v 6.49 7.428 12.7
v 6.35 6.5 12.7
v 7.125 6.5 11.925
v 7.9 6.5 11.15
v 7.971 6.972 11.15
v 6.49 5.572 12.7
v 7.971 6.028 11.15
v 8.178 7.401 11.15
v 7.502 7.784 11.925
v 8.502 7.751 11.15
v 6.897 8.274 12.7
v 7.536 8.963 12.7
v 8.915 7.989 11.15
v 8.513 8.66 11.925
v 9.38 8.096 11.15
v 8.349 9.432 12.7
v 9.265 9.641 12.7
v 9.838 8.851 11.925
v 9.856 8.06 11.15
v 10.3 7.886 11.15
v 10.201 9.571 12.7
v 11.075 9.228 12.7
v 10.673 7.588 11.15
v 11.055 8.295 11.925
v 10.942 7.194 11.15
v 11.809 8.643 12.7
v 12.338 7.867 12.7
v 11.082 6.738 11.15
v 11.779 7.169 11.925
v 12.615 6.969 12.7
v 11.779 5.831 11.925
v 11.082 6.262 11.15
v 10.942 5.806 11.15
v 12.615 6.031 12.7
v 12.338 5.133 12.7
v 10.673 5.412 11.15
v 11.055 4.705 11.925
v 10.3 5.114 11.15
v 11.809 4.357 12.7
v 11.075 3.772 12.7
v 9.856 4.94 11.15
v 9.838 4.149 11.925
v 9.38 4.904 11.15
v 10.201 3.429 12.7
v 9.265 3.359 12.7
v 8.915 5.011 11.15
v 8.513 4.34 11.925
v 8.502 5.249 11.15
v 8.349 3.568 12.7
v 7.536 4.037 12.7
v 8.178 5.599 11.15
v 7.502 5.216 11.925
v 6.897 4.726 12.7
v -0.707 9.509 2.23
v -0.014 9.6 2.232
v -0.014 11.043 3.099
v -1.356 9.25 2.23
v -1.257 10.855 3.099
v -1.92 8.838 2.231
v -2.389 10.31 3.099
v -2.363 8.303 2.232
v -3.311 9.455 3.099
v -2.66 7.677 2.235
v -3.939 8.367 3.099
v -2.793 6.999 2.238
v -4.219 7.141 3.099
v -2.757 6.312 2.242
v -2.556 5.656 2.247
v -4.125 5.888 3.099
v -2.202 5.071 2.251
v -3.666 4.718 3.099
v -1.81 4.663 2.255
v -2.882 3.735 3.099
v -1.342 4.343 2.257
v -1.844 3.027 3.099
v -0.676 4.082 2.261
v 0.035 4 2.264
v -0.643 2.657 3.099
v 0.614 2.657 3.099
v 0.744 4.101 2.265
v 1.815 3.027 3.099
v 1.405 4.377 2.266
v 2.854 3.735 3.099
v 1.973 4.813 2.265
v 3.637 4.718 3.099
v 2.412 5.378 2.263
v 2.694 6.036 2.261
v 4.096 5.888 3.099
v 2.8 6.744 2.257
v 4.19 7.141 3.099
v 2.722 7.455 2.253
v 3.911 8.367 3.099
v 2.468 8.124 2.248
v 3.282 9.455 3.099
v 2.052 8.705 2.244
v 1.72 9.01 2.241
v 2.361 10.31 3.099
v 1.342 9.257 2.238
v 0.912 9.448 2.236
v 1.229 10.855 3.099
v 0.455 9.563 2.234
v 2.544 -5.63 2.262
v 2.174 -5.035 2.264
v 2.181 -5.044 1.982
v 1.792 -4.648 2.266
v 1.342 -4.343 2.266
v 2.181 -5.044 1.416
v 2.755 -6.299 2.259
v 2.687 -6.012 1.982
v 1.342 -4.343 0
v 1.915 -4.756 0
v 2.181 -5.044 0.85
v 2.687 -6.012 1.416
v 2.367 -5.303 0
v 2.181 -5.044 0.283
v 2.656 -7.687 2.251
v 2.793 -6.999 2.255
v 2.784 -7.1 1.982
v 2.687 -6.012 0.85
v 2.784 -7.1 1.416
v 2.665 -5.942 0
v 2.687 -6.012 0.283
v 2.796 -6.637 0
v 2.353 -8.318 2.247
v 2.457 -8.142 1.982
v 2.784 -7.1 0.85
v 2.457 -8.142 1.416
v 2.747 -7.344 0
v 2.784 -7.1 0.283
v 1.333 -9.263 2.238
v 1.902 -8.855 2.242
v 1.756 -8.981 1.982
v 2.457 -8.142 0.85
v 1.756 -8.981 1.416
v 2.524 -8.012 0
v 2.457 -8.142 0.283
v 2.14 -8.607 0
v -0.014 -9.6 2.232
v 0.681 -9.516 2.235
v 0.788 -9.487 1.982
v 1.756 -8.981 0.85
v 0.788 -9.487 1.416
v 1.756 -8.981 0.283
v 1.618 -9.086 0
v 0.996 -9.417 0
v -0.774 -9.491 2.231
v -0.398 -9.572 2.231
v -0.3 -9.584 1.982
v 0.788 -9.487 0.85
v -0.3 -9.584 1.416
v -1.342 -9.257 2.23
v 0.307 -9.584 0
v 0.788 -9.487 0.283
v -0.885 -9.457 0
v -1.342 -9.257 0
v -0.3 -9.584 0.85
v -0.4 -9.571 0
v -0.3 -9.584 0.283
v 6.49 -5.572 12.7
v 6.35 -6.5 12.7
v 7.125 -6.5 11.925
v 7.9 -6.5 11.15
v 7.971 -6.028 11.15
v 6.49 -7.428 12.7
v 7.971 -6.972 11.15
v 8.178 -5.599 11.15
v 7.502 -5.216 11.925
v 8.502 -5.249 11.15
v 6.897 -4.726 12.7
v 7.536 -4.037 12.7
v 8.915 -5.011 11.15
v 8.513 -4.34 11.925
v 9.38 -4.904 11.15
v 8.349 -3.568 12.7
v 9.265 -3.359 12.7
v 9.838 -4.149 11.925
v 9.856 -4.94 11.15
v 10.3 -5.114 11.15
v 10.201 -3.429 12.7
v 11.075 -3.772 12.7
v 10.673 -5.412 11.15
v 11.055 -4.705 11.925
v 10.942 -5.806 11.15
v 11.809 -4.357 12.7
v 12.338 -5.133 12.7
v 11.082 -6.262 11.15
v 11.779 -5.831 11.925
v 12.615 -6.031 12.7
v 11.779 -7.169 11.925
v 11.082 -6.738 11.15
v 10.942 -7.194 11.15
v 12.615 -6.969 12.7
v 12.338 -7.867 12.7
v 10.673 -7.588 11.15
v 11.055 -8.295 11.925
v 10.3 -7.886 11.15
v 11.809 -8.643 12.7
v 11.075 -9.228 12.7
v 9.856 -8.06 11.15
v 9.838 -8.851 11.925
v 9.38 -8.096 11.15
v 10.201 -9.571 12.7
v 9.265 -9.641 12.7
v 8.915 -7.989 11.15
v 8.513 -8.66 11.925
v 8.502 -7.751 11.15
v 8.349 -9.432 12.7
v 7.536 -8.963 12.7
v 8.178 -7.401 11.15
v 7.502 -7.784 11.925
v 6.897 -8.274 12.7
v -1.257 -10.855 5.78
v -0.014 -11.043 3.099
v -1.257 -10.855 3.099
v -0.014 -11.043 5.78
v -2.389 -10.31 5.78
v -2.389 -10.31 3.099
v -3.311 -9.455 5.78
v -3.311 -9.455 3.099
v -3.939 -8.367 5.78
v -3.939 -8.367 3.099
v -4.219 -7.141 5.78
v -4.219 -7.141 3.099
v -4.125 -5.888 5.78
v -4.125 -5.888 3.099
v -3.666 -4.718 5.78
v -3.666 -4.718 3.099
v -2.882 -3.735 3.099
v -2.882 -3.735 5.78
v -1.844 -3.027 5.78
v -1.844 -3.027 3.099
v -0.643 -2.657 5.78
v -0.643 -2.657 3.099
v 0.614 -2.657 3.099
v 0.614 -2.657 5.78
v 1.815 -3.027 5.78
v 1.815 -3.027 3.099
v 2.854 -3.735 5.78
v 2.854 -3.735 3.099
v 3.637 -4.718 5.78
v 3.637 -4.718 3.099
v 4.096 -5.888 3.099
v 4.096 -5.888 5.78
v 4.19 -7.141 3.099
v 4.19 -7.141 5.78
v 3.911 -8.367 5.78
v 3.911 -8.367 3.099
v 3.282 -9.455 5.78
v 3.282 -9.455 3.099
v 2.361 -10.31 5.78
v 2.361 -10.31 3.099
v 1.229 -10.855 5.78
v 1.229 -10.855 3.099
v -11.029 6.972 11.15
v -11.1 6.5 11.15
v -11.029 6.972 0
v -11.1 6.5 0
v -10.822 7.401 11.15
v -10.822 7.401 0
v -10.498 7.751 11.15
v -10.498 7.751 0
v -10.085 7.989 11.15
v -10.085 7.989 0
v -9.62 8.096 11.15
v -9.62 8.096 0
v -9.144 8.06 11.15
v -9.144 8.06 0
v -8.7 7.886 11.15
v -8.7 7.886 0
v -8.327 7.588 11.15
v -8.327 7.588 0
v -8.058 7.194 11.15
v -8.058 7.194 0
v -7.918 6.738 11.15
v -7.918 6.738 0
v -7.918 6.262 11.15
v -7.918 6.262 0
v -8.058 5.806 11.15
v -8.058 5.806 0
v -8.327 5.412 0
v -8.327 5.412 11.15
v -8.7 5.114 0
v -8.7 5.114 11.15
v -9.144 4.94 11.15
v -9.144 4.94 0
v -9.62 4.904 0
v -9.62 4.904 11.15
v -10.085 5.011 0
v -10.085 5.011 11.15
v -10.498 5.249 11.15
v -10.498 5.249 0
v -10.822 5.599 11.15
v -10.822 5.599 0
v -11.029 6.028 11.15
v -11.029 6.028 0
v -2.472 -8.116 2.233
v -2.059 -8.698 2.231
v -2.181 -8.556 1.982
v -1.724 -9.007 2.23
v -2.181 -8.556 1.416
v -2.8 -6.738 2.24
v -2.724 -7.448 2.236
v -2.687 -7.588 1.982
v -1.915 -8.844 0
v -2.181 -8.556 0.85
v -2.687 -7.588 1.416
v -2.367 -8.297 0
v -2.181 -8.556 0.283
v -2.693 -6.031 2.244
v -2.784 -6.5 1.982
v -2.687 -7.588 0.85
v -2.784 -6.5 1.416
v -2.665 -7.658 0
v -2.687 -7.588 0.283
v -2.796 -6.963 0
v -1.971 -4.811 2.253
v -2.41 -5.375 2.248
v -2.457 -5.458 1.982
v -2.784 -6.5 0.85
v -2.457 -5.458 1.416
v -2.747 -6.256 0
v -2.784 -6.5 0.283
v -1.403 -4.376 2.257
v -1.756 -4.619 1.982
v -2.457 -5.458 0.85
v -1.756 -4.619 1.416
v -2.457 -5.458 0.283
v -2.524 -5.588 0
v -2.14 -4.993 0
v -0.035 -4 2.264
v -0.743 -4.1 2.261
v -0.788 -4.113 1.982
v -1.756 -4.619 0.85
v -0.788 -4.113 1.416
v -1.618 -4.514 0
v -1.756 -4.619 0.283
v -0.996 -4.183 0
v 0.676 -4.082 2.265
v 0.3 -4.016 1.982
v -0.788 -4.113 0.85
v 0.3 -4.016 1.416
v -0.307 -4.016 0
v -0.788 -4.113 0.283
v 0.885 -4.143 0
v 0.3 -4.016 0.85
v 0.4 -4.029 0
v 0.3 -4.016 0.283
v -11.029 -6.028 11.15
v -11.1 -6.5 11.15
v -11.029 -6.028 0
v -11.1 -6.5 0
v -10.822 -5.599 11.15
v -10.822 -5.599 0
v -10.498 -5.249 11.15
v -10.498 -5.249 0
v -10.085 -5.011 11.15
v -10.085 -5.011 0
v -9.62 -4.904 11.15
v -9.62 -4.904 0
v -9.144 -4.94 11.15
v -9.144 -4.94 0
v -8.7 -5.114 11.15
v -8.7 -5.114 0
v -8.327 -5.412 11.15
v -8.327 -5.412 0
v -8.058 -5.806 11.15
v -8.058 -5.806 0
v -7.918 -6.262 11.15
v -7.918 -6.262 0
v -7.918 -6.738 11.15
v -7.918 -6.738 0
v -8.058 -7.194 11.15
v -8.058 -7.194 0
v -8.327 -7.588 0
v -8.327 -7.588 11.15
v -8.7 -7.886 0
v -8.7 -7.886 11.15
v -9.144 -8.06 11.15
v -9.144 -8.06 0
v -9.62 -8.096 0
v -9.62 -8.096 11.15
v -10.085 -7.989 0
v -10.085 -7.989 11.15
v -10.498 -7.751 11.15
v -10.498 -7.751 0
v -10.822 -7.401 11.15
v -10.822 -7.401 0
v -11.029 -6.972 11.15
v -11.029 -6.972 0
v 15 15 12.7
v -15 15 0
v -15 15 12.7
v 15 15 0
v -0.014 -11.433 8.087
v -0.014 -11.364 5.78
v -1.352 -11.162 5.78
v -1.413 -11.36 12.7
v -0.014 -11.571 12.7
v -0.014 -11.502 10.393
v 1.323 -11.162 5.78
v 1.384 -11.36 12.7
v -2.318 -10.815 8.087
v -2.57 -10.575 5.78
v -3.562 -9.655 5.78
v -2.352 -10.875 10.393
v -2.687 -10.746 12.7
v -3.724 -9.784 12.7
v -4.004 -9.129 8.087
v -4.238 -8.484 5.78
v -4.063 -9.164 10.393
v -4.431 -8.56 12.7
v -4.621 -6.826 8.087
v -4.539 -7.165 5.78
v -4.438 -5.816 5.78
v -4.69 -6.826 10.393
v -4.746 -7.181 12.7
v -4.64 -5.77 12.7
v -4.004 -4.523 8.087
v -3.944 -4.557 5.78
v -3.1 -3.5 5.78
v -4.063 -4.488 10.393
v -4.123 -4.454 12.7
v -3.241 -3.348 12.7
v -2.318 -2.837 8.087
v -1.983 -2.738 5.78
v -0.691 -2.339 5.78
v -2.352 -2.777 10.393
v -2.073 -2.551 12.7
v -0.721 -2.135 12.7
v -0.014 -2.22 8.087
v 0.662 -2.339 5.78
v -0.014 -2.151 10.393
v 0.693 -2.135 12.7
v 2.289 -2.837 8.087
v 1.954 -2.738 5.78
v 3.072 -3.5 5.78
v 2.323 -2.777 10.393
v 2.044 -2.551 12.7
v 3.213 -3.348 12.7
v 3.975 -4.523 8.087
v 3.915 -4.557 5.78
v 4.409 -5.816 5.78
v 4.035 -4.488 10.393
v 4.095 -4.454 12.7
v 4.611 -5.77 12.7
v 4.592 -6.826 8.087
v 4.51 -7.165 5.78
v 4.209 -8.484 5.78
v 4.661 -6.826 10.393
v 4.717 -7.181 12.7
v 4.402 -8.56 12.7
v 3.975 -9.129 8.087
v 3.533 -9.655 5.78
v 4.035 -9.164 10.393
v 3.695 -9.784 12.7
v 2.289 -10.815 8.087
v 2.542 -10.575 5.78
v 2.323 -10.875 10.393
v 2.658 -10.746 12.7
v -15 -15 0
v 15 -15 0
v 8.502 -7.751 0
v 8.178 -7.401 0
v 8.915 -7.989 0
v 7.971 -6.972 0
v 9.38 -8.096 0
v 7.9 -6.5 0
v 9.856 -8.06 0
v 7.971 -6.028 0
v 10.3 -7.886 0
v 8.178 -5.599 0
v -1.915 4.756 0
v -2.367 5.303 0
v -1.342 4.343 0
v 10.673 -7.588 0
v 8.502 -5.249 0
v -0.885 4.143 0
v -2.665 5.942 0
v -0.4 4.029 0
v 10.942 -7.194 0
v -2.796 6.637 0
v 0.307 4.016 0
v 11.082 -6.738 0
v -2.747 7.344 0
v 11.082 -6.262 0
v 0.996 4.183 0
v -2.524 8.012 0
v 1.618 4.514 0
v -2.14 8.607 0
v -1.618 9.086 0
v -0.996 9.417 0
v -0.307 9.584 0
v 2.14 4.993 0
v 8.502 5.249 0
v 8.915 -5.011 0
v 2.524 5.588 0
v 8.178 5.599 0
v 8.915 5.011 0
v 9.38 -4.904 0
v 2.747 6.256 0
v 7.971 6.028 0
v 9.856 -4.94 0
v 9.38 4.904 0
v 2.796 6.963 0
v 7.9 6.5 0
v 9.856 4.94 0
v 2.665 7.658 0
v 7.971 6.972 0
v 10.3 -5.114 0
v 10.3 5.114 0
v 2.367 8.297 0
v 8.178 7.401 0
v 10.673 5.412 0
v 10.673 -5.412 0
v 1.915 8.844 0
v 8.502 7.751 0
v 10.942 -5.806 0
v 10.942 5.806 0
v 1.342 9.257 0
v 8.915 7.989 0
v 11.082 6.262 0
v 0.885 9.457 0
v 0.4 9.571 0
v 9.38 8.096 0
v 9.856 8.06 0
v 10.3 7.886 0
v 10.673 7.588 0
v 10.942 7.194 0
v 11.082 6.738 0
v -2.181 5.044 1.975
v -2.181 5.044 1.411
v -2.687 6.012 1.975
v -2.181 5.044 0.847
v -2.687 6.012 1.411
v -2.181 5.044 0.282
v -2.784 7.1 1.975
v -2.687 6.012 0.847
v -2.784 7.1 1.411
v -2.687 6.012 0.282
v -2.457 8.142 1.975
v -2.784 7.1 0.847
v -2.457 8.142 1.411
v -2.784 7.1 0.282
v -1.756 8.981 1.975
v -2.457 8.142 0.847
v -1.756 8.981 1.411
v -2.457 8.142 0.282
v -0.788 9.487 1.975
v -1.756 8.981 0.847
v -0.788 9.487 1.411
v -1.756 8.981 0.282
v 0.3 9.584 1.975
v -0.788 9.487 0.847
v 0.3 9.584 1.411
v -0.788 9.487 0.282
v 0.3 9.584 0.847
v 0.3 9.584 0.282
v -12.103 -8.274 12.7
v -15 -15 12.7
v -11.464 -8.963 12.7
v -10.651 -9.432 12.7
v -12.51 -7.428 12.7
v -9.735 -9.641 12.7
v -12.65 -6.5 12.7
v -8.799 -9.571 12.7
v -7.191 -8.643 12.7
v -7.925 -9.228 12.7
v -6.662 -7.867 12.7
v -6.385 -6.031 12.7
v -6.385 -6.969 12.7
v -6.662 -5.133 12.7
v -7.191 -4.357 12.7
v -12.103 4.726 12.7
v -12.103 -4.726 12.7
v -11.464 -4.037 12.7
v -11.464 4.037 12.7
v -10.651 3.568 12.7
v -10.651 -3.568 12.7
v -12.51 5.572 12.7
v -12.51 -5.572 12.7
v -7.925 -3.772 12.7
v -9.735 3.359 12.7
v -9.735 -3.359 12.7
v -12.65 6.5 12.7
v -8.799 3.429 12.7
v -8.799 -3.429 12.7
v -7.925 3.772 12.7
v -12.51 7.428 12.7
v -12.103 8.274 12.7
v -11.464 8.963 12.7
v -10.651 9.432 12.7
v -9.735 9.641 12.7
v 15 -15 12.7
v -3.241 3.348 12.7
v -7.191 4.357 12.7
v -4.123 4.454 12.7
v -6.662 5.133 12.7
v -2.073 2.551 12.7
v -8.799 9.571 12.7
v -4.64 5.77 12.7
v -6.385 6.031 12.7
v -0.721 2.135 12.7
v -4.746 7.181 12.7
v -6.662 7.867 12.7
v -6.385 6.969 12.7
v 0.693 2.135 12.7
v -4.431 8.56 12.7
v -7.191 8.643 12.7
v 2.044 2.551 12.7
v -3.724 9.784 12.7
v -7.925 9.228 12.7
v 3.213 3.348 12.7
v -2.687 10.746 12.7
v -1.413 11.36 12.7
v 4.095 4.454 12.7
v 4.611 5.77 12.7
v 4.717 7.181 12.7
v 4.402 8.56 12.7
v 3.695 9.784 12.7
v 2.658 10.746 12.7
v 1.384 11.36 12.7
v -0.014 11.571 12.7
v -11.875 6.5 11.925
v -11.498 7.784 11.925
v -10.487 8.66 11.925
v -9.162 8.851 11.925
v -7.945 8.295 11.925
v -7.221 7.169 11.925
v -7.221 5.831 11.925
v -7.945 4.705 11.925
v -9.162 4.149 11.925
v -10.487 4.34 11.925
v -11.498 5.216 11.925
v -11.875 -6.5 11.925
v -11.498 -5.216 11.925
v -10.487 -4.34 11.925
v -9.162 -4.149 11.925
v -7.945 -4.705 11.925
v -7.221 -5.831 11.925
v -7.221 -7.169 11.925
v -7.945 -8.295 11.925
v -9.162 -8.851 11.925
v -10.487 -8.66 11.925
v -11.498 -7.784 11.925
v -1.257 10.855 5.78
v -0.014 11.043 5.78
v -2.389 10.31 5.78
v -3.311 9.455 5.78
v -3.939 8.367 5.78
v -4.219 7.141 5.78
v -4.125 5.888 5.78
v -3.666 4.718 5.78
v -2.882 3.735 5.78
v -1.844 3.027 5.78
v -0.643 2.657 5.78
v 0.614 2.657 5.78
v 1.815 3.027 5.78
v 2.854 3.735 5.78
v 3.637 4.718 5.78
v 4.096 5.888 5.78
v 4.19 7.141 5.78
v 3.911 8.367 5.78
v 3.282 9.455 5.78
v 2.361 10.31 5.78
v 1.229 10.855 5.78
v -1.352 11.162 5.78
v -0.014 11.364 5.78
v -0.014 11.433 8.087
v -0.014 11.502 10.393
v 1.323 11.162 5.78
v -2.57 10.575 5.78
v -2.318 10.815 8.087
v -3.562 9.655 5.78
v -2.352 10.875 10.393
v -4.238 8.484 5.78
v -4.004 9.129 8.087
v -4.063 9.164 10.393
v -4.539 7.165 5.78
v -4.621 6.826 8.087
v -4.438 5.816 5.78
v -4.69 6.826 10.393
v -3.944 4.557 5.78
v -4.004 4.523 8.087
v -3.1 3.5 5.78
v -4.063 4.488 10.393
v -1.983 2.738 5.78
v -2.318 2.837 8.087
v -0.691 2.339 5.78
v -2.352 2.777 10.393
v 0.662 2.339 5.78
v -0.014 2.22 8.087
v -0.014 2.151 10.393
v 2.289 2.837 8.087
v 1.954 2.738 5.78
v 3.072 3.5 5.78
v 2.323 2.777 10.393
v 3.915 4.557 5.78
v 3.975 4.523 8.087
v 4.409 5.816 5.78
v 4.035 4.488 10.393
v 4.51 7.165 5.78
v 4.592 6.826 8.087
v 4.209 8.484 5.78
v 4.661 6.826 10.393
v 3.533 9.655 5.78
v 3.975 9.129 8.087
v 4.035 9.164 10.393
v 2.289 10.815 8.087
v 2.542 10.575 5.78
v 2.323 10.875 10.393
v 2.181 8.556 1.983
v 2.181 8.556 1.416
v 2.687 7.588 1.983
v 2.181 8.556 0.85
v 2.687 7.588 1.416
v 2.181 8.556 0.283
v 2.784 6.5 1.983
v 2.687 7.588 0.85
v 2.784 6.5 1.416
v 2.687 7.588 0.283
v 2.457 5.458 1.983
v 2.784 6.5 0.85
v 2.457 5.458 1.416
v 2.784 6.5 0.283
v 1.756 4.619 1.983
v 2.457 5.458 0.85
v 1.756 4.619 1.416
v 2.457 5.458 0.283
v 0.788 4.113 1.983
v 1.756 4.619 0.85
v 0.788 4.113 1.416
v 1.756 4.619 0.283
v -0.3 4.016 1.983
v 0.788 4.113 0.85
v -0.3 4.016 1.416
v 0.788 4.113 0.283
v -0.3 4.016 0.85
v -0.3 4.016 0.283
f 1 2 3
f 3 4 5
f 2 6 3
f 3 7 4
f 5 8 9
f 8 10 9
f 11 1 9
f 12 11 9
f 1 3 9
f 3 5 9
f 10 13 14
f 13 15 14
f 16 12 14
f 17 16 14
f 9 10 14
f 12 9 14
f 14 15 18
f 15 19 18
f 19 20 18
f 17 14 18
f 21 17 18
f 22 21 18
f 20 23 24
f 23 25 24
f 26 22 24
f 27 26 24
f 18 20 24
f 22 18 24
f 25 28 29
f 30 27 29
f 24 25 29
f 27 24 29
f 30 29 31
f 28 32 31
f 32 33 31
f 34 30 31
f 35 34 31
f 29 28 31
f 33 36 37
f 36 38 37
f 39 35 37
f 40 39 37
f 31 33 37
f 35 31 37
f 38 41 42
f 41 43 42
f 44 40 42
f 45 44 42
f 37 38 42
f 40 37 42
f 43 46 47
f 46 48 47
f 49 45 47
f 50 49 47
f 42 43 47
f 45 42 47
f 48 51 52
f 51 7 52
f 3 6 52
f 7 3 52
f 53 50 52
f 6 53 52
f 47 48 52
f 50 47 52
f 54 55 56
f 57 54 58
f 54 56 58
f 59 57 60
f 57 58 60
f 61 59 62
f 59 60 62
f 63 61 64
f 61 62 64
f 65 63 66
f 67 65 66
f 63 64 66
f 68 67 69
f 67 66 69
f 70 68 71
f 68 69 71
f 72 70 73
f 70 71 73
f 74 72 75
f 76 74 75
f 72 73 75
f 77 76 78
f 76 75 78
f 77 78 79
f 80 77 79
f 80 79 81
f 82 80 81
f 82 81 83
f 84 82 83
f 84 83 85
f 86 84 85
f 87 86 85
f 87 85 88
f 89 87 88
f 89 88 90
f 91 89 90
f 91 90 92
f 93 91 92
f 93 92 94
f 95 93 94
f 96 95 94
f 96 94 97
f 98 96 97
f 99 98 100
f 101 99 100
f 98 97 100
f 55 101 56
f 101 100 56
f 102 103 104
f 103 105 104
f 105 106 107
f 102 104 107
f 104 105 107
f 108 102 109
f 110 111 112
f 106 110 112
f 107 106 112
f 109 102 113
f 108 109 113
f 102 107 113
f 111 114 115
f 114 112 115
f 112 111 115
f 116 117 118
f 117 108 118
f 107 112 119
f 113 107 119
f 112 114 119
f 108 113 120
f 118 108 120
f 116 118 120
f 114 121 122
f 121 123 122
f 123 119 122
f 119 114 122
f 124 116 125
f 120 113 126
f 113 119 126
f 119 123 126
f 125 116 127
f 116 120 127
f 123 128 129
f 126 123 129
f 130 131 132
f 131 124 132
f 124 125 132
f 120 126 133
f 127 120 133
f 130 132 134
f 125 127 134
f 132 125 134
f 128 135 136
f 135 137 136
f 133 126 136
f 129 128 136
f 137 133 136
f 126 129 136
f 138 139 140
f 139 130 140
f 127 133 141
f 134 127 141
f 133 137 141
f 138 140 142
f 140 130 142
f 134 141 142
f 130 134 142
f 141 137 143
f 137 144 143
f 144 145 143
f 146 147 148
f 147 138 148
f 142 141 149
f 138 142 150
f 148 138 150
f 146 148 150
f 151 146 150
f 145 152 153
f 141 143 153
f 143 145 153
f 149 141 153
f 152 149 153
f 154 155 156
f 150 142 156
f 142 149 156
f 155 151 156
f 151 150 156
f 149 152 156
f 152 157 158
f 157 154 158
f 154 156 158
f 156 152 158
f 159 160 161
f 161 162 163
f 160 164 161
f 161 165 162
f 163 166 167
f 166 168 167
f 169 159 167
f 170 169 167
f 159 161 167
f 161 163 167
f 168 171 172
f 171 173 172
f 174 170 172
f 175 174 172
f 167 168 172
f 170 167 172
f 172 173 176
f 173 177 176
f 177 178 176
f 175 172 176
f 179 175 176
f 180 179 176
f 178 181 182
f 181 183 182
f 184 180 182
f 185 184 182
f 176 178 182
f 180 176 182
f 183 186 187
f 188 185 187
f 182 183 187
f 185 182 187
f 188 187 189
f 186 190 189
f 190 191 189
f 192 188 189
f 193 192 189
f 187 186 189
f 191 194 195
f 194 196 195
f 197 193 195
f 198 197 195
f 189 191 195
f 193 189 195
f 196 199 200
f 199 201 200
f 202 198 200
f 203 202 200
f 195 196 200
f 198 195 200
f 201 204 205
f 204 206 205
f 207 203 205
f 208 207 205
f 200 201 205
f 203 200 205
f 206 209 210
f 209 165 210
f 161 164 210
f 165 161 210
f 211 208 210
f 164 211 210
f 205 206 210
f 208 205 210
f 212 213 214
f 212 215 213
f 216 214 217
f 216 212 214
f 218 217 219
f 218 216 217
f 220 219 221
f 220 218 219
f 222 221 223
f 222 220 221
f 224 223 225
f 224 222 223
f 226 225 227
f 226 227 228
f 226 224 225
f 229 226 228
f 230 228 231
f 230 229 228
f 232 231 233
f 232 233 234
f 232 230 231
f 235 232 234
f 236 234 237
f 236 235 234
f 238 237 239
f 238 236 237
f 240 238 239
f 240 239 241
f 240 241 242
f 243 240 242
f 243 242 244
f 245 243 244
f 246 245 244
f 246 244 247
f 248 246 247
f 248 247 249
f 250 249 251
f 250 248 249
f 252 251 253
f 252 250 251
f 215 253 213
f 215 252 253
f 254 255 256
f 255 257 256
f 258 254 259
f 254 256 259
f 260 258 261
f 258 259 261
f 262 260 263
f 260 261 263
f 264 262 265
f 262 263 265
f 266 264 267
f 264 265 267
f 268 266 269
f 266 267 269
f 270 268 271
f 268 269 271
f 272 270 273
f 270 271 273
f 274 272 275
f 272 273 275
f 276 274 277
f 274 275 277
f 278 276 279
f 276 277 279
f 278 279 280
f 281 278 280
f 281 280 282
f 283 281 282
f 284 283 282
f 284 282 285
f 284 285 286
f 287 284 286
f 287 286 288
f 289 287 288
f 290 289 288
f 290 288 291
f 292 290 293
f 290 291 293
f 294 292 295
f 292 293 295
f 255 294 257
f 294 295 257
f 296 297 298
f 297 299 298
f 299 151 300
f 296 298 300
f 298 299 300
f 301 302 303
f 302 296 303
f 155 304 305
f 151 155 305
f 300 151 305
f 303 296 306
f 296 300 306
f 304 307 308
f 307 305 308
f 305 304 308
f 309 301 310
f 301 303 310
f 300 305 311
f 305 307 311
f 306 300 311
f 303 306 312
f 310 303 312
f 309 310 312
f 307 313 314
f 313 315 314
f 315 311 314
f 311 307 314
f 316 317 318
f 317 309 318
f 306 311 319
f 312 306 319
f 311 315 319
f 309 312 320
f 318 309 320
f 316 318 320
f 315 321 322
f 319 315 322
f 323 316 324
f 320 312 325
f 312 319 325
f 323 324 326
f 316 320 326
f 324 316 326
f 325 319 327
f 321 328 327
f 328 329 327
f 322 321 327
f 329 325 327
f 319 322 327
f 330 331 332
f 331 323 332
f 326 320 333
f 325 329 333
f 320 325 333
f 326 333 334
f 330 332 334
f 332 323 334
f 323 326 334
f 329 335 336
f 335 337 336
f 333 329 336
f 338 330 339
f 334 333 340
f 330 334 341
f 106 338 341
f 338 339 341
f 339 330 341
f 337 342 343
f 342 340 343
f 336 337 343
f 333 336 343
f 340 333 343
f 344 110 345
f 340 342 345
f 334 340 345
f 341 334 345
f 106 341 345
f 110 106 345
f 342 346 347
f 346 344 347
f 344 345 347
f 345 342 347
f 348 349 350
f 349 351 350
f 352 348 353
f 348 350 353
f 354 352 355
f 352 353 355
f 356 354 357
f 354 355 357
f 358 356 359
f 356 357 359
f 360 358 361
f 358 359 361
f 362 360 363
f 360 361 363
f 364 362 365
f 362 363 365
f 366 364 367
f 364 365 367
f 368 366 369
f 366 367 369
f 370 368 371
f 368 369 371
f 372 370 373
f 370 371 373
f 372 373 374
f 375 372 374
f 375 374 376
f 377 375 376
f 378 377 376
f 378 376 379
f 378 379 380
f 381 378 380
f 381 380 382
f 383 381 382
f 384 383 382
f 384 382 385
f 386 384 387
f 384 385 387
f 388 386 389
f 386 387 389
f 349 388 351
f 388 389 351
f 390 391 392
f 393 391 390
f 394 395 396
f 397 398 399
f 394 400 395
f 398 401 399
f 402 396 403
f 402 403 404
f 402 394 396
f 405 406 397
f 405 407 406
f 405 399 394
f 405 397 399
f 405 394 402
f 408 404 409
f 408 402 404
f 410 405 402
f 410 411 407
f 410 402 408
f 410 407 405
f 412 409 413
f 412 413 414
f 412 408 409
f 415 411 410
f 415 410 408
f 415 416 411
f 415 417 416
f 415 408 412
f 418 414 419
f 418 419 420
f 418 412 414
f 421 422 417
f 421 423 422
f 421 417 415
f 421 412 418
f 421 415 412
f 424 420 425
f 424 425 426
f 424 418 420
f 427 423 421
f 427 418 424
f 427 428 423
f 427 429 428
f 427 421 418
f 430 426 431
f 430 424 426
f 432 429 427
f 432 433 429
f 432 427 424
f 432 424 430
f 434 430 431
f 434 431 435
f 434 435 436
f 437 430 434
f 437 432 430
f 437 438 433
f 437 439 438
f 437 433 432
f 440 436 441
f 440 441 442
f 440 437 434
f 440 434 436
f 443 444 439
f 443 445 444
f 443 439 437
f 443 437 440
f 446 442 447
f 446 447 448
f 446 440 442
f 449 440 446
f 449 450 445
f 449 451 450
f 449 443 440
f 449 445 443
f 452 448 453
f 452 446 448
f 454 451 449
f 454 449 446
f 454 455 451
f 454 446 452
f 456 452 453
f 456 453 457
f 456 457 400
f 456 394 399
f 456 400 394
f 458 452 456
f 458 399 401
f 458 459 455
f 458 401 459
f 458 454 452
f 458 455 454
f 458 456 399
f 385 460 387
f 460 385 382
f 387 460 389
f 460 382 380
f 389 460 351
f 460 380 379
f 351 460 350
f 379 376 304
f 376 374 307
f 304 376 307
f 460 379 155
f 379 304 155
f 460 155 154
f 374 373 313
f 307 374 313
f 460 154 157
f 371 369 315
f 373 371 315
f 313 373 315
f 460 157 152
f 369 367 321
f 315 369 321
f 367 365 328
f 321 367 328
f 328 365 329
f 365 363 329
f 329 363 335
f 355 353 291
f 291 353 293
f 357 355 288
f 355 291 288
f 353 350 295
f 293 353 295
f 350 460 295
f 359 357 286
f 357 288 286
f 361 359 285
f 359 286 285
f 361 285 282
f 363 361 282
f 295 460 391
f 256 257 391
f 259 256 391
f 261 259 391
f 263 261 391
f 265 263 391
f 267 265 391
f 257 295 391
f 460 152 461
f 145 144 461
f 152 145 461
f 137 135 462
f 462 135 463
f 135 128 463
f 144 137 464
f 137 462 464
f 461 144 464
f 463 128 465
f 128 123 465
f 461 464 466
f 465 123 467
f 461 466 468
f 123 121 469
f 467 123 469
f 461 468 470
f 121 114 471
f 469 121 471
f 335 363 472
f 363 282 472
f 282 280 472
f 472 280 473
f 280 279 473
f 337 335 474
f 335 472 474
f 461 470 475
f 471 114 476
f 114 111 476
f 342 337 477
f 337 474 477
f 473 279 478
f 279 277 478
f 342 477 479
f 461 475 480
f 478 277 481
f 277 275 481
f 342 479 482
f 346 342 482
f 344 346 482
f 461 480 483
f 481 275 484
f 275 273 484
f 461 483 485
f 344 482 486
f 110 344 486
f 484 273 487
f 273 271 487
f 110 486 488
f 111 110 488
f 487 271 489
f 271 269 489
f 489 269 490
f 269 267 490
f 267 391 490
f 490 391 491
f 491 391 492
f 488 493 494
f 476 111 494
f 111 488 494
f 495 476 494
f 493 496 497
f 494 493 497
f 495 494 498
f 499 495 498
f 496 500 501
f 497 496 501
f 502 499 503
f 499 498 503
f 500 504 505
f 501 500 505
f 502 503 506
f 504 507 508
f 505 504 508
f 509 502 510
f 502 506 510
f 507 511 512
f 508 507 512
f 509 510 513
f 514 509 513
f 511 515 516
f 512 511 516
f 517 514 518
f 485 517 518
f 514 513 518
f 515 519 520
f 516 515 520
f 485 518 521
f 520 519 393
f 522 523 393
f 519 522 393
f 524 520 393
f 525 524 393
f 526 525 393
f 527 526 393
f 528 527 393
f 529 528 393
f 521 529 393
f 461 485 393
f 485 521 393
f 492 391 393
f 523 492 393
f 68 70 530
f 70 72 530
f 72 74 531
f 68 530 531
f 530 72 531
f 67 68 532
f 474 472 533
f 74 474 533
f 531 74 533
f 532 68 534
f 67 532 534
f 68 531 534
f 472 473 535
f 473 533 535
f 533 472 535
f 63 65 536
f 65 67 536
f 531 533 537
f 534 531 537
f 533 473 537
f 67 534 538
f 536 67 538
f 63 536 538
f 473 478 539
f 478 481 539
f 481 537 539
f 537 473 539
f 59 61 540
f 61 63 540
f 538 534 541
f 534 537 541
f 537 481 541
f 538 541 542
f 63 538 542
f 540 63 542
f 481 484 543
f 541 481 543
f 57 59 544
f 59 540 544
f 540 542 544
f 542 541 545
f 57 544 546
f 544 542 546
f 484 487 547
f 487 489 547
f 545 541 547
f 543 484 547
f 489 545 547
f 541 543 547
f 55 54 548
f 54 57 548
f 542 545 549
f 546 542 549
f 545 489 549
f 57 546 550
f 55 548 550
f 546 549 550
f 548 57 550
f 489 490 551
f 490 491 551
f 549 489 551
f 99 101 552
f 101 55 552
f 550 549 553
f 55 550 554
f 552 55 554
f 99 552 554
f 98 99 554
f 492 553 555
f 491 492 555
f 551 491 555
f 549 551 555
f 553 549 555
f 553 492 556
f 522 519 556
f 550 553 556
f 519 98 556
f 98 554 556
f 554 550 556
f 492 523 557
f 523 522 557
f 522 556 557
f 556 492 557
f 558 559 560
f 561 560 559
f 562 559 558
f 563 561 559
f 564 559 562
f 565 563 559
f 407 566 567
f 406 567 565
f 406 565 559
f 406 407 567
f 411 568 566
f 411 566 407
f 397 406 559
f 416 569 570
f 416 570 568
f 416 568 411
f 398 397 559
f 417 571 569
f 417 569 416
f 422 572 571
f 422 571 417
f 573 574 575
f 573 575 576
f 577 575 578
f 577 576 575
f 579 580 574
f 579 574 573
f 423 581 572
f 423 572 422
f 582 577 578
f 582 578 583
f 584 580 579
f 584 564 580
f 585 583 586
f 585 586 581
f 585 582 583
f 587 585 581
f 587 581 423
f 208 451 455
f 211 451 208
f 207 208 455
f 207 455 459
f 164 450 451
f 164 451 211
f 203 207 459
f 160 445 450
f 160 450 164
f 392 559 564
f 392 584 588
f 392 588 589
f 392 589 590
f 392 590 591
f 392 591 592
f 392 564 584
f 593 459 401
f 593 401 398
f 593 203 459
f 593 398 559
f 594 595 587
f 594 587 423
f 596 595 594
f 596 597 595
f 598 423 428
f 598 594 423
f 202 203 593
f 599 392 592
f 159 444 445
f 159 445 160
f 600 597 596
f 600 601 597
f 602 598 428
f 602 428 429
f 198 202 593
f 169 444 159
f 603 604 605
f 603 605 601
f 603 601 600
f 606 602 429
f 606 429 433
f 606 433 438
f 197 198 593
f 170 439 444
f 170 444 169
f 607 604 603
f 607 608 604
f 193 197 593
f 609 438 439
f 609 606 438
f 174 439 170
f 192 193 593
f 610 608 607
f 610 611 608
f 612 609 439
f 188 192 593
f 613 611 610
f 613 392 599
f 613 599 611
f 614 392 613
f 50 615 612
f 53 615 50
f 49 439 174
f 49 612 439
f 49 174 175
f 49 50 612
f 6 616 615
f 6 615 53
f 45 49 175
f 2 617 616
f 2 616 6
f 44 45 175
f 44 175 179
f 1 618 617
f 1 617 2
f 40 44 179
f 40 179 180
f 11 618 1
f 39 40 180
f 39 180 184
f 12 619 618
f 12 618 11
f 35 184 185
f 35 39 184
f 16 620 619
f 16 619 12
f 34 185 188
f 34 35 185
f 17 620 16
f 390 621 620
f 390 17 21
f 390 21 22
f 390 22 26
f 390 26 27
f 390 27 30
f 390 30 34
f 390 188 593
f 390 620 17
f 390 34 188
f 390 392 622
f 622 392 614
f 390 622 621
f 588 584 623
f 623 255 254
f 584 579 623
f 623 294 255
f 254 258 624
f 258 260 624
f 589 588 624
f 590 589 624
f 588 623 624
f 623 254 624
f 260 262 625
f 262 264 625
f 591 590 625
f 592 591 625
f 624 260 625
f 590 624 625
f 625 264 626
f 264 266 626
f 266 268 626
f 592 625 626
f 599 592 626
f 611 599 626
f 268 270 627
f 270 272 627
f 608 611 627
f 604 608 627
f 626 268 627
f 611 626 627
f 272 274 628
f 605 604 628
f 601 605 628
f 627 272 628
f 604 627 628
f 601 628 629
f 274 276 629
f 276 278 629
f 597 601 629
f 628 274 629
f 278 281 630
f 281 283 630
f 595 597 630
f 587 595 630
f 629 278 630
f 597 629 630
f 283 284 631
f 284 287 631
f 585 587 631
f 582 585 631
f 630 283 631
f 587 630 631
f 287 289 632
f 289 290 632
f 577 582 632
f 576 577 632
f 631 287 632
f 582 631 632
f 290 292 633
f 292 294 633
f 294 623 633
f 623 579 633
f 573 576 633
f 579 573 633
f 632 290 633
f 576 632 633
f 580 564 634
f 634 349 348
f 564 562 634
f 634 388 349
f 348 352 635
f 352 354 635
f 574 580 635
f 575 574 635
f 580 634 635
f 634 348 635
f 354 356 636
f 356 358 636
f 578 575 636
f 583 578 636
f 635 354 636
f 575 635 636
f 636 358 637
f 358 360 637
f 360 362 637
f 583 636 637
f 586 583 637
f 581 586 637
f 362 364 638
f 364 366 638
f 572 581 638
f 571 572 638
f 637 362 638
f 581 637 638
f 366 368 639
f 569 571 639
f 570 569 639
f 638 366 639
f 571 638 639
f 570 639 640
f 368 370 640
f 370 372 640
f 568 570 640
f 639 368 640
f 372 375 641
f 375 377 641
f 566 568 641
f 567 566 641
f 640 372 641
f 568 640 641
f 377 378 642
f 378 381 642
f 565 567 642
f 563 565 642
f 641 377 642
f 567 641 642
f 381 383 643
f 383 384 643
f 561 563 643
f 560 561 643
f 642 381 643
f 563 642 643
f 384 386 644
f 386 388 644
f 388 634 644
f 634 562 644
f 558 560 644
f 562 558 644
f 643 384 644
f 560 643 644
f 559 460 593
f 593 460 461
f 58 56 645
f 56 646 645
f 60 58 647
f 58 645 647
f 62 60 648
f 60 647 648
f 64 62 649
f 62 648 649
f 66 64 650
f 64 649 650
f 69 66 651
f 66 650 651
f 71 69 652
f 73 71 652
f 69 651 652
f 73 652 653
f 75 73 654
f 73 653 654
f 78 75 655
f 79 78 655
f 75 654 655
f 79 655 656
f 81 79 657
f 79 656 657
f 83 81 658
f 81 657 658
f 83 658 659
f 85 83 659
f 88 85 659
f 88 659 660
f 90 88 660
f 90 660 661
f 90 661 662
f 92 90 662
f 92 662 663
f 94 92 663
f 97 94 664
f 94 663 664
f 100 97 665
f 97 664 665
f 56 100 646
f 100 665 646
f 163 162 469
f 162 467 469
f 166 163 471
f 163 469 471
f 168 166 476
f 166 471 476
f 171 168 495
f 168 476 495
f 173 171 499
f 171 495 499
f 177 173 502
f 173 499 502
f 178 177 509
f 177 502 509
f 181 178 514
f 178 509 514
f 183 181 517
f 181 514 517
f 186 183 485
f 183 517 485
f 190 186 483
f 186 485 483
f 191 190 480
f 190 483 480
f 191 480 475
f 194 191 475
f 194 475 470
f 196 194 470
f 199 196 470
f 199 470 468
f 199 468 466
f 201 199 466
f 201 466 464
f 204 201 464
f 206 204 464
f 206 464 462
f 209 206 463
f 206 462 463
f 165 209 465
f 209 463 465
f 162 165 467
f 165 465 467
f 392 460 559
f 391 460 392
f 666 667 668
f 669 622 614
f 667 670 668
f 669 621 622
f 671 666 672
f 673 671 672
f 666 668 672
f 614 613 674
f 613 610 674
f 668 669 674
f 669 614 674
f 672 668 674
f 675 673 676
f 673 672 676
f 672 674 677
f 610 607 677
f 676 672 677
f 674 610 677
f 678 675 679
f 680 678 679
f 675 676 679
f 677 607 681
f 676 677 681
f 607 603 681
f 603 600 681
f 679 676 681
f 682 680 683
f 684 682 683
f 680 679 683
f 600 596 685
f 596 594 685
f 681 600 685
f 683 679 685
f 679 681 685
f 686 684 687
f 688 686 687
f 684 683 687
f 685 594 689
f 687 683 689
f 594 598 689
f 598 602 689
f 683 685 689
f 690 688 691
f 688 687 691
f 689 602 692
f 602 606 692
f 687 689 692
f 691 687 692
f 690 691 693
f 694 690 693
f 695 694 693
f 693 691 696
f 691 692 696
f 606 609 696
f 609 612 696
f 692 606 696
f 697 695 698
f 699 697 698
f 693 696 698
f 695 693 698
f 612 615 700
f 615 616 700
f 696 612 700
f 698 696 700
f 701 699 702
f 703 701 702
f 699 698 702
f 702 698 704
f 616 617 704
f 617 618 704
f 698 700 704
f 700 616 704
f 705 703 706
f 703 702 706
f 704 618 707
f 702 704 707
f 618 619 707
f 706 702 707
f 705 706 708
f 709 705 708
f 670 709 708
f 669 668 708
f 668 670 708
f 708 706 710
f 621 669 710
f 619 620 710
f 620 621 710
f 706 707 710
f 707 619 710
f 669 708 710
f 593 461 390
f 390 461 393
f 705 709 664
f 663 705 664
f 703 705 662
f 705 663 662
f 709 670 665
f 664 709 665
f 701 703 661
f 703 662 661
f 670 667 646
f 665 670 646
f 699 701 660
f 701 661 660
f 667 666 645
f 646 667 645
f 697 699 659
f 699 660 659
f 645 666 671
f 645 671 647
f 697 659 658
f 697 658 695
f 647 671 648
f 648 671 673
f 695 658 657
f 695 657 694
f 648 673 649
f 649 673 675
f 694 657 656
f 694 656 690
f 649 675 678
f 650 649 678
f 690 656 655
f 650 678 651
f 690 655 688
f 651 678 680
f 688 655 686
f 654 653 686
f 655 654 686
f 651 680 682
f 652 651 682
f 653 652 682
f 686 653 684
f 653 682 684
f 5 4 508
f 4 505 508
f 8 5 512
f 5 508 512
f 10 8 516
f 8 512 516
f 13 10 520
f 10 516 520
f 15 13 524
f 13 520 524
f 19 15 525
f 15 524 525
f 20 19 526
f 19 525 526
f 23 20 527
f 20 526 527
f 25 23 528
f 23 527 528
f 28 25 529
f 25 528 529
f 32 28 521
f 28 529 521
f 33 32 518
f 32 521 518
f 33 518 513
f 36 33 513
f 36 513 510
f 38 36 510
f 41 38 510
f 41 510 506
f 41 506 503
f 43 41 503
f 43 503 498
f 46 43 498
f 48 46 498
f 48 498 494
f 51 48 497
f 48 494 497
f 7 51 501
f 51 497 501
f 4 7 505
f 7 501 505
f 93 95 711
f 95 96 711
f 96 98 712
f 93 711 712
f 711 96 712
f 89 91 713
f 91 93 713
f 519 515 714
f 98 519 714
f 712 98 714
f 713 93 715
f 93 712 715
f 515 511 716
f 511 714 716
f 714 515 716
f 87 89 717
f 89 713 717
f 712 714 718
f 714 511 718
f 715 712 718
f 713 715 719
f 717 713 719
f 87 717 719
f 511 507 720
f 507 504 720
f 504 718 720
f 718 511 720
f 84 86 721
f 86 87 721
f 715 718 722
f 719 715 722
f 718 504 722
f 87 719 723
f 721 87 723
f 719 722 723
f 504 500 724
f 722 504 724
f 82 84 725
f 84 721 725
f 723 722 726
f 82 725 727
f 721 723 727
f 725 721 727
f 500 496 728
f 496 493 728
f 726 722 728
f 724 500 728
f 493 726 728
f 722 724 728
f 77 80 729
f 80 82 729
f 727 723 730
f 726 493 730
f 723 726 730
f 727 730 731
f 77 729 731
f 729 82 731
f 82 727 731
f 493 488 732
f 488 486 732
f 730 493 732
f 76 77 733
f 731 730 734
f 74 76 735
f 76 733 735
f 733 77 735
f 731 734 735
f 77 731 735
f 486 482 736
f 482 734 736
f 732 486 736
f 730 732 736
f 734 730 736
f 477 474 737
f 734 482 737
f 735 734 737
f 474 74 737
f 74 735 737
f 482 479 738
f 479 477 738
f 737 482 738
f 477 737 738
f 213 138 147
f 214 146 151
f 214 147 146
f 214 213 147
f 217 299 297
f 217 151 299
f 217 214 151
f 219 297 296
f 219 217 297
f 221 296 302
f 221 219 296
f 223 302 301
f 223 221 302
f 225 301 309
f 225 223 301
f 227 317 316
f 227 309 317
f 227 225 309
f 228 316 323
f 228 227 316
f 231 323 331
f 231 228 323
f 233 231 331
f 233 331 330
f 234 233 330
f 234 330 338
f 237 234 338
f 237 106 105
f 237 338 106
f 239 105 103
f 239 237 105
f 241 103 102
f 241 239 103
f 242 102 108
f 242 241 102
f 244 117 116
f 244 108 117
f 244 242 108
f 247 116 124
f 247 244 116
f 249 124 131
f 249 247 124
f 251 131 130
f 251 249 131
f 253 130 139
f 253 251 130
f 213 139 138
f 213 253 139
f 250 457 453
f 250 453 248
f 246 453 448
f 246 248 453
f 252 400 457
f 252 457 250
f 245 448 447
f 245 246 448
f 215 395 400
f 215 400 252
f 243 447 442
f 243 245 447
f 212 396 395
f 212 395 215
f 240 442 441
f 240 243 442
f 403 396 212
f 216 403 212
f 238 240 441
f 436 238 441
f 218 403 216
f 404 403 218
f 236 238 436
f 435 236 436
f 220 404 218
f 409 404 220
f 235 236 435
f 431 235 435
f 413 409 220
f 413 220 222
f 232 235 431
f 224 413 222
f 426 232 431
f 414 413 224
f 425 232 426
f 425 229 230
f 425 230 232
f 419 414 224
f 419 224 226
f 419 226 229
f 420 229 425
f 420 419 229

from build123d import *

# Parameters (mm, degrees)
SKETCH1_W                                       = 30
SKETCH1_H                                       = 30
BOSS_EXTRUDE1_DEPTH                             = 12.7
CSK_FOR_M3_FLAT_HEAD_MACHINE_SCREW1_D           = 3.2
CSK_FOR_M3_FLAT_HEAD_MACHINE_SCREW1_CSINK_D     = 6.3
CSK_FOR_M3_FLAT_HEAD_MACHINE_SCREW1_CSINK_ANGLE = 90


with BuildPart() as part:
    # Sketch1 → Boss-Extrude1 (new body)
    with BuildSketch(Plane.XY):
        Rectangle(SKETCH1_W, SKETCH1_H)
        with BuildLine():
            ThreePointArc((-8.9105463, -5.42101224), (-10.57898776, -5.9105463), (-10.0894537, -7.57898776))
            ThreePointArc((-10.0894537, -7.57898776), (-8.42101224, -7.0894537), (-8.9105463, -5.42101224))
        make_face(mode=Mode.SUBTRACT)
        with BuildLine():
            ThreePointArc((-8.9105463, 7.57898776), (-10.57898776, 7.0894537), (-10.0894537, 5.42101224))
            ThreePointArc((-10.0894537, 5.42101224), (-8.42101224, 5.9105463), (-8.9105463, 7.57898776))
        make_face(mode=Mode.SUBTRACT)
        with BuildLine():
            ThreePointArc((10.0894537, 7.57898776), (8.42101224, 7.0894537), (8.9105463, 5.42101224))
            ThreePointArc((8.9105463, 5.42101224), (10.57898776, 5.9105463), (10.0894537, 7.57898776))
        make_face(mode=Mode.SUBTRACT)
        with BuildLine():
            ThreePointArc((10.0894537, -5.42101224), (8.42101224, -5.9105463), (8.9105463, -7.57898776))
            ThreePointArc((8.9105463, -7.57898776), (10.57898776, -7.0894537), (10.0894537, -5.42101224))
        make_face(mode=Mode.SUBTRACT)
        with BuildLine():
            add(Edge.make_bspline(
                [(-1.342391508, -9.257231173), (-1.831415943, -8.990075907), (-2.180549698, -8.556474598), (-2.530193945, -8.122239293), (-2.686738964, -7.588310687), (-2.84359347, -7.053326516), (-2.783896578, -6.500133621), (-2.724081666, -5.945847074), (-2.457231173, -5.457608492), (-2.189853123, -4.968404672), (-1.756474598, -4.619450302), (-1.322239293, -4.269806055), (-0.788310687, -4.113261036), (-0.253326516, -3.95640653), (0.299866379, -4.016103422), (0.853868841, -4.075887677), (1.342391508, -4.342768827)],
                knots=[0, 0, 0, 0.125, 0.125, 0.25, 0.25, 0.375, 0.375, 0.5, 0.5, 0.625, 0.625, 0.75, 0.75, 0.875, 0.875, 1, 1, 1], degree=2))
            add(Edge.make_bspline(
                [(1.342391508, -4.342768827), (1.831415943, -4.609924093), (2.180549698, -5.043525402), (2.530193945, -5.477760707), (2.686738964, -6.011689313), (2.84359347, -6.546673484), (2.783896578, -7.099866379), (2.724081666, -7.654152926), (2.457231173, -8.142391508), (2.189853123, -8.631595328), (1.756474598, -8.980549698), (1.322239293, -9.330193945), (0.788310687, -9.486738964), (0.253326516, -9.64359347), (-0.299866379, -9.583896578), (-0.853868841, -9.524112323), (-1.342391508, -9.257231173)],
                knots=[0, 0, 0, 0.125, 0.125, 0.25, 0.25, 0.375, 0.375, 0.5, 0.5, 0.625, 0.625, 0.75, 0.75, 0.875, 0.875, 1, 1, 1], degree=2))
        make_face(mode=Mode.SUBTRACT)
        with BuildLine():
            add(Edge.make_bspline(
                [(1.342391508, 9.257231173), (1.831415943, 8.990075907), (2.180549698, 8.556474598), (2.530193945, 8.122239293), (2.686738964, 7.588310687), (2.84359347, 7.053326516), (2.783896578, 6.500133621), (2.724081666, 5.945847074), (2.457231173, 5.457608492), (2.189853123, 4.968404672), (1.756474598, 4.619450302), (1.322239293, 4.269806055), (0.788310687, 4.113261036), (0.253326516, 3.95640653), (-0.299866379, 4.016103422), (-0.853868841, 4.075887677), (-1.342391508, 4.342768827)],
                knots=[0, 0, 0, 0.125, 0.125, 0.25, 0.25, 0.375, 0.375, 0.5, 0.5, 0.625, 0.625, 0.75, 0.75, 0.875, 0.875, 1, 1, 1], degree=2))
            add(Edge.make_bspline(
                [(-1.342391508, 4.342768827), (-1.831415943, 4.609924093), (-2.180549698, 5.043525402), (-2.530193945, 5.477760707), (-2.686738964, 6.011689313), (-2.84359347, 6.546673484), (-2.783896578, 7.099866379), (-2.724081666, 7.654152926), (-2.457231173, 8.142391508), (-2.189853123, 8.631595328), (-1.756474598, 8.980549698), (-1.322239293, 9.330193945), (-0.788310687, 9.486738964), (-0.253326516, 9.64359347), (0.299866379, 9.583896578), (0.853868841, 9.524112323), (1.342391508, 9.257231173)],
                knots=[0, 0, 0, 0.125, 0.125, 0.25, 0.25, 0.375, 0.375, 0.5, 0.5, 0.625, 0.625, 0.75, 0.75, 0.875, 0.875, 1, 1, 1], degree=2))
        make_face(mode=Mode.SUBTRACT)
    extrude(amount=BOSS_EXTRUDE1_DEPTH)

    # CSK for M3 Flat Head Machine Screw1 (through all)
    with Locations(Plane.XY.offset(12.7)):
        with Locations((-9.5, -6.5), (-9.5, 6.5), (9.5, 6.5), (9.5, -6.5)):
            CounterSinkHole(CSK_FOR_M3_FLAT_HEAD_MACHINE_SCREW1_D / 2, CSK_FOR_M3_FLAT_HEAD_MACHINE_SCREW1_CSINK_D / 2, counter_sink_angle=CSK_FOR_M3_FLAT_HEAD_MACHINE_SCREW1_CSINK_ANGLE)

    # Sketch10 → 1/8 NPT Tapped Hole1 (revolve, cut)
    with BuildSketch(Plane(origin=(-0.014274842, -6.826129923, 12.7), x_dir=(0, -1, 0), z_dir=(1, 0, 0))):
        Polygon((0, 0), (0, 12.134668714), (4.2164, 9.6012), (4.2164, 6.92), (4.537398933, 6.92), (4.744593, 0), align=None)
    f_1_8_npt_tapped_hole1 = revolve(axis=Axis((-0.014274842, -6.826129923, 19.05), (0, 0, -1)), mode=Mode.SUBTRACT)

    # Mirror1: 1/8 NPT Tapped Hole1 across plane
    add(f_1_8_npt_tapped_hole1.mirror(Plane.ZX), mode=Mode.SUBTRACT)


solid = part.part
